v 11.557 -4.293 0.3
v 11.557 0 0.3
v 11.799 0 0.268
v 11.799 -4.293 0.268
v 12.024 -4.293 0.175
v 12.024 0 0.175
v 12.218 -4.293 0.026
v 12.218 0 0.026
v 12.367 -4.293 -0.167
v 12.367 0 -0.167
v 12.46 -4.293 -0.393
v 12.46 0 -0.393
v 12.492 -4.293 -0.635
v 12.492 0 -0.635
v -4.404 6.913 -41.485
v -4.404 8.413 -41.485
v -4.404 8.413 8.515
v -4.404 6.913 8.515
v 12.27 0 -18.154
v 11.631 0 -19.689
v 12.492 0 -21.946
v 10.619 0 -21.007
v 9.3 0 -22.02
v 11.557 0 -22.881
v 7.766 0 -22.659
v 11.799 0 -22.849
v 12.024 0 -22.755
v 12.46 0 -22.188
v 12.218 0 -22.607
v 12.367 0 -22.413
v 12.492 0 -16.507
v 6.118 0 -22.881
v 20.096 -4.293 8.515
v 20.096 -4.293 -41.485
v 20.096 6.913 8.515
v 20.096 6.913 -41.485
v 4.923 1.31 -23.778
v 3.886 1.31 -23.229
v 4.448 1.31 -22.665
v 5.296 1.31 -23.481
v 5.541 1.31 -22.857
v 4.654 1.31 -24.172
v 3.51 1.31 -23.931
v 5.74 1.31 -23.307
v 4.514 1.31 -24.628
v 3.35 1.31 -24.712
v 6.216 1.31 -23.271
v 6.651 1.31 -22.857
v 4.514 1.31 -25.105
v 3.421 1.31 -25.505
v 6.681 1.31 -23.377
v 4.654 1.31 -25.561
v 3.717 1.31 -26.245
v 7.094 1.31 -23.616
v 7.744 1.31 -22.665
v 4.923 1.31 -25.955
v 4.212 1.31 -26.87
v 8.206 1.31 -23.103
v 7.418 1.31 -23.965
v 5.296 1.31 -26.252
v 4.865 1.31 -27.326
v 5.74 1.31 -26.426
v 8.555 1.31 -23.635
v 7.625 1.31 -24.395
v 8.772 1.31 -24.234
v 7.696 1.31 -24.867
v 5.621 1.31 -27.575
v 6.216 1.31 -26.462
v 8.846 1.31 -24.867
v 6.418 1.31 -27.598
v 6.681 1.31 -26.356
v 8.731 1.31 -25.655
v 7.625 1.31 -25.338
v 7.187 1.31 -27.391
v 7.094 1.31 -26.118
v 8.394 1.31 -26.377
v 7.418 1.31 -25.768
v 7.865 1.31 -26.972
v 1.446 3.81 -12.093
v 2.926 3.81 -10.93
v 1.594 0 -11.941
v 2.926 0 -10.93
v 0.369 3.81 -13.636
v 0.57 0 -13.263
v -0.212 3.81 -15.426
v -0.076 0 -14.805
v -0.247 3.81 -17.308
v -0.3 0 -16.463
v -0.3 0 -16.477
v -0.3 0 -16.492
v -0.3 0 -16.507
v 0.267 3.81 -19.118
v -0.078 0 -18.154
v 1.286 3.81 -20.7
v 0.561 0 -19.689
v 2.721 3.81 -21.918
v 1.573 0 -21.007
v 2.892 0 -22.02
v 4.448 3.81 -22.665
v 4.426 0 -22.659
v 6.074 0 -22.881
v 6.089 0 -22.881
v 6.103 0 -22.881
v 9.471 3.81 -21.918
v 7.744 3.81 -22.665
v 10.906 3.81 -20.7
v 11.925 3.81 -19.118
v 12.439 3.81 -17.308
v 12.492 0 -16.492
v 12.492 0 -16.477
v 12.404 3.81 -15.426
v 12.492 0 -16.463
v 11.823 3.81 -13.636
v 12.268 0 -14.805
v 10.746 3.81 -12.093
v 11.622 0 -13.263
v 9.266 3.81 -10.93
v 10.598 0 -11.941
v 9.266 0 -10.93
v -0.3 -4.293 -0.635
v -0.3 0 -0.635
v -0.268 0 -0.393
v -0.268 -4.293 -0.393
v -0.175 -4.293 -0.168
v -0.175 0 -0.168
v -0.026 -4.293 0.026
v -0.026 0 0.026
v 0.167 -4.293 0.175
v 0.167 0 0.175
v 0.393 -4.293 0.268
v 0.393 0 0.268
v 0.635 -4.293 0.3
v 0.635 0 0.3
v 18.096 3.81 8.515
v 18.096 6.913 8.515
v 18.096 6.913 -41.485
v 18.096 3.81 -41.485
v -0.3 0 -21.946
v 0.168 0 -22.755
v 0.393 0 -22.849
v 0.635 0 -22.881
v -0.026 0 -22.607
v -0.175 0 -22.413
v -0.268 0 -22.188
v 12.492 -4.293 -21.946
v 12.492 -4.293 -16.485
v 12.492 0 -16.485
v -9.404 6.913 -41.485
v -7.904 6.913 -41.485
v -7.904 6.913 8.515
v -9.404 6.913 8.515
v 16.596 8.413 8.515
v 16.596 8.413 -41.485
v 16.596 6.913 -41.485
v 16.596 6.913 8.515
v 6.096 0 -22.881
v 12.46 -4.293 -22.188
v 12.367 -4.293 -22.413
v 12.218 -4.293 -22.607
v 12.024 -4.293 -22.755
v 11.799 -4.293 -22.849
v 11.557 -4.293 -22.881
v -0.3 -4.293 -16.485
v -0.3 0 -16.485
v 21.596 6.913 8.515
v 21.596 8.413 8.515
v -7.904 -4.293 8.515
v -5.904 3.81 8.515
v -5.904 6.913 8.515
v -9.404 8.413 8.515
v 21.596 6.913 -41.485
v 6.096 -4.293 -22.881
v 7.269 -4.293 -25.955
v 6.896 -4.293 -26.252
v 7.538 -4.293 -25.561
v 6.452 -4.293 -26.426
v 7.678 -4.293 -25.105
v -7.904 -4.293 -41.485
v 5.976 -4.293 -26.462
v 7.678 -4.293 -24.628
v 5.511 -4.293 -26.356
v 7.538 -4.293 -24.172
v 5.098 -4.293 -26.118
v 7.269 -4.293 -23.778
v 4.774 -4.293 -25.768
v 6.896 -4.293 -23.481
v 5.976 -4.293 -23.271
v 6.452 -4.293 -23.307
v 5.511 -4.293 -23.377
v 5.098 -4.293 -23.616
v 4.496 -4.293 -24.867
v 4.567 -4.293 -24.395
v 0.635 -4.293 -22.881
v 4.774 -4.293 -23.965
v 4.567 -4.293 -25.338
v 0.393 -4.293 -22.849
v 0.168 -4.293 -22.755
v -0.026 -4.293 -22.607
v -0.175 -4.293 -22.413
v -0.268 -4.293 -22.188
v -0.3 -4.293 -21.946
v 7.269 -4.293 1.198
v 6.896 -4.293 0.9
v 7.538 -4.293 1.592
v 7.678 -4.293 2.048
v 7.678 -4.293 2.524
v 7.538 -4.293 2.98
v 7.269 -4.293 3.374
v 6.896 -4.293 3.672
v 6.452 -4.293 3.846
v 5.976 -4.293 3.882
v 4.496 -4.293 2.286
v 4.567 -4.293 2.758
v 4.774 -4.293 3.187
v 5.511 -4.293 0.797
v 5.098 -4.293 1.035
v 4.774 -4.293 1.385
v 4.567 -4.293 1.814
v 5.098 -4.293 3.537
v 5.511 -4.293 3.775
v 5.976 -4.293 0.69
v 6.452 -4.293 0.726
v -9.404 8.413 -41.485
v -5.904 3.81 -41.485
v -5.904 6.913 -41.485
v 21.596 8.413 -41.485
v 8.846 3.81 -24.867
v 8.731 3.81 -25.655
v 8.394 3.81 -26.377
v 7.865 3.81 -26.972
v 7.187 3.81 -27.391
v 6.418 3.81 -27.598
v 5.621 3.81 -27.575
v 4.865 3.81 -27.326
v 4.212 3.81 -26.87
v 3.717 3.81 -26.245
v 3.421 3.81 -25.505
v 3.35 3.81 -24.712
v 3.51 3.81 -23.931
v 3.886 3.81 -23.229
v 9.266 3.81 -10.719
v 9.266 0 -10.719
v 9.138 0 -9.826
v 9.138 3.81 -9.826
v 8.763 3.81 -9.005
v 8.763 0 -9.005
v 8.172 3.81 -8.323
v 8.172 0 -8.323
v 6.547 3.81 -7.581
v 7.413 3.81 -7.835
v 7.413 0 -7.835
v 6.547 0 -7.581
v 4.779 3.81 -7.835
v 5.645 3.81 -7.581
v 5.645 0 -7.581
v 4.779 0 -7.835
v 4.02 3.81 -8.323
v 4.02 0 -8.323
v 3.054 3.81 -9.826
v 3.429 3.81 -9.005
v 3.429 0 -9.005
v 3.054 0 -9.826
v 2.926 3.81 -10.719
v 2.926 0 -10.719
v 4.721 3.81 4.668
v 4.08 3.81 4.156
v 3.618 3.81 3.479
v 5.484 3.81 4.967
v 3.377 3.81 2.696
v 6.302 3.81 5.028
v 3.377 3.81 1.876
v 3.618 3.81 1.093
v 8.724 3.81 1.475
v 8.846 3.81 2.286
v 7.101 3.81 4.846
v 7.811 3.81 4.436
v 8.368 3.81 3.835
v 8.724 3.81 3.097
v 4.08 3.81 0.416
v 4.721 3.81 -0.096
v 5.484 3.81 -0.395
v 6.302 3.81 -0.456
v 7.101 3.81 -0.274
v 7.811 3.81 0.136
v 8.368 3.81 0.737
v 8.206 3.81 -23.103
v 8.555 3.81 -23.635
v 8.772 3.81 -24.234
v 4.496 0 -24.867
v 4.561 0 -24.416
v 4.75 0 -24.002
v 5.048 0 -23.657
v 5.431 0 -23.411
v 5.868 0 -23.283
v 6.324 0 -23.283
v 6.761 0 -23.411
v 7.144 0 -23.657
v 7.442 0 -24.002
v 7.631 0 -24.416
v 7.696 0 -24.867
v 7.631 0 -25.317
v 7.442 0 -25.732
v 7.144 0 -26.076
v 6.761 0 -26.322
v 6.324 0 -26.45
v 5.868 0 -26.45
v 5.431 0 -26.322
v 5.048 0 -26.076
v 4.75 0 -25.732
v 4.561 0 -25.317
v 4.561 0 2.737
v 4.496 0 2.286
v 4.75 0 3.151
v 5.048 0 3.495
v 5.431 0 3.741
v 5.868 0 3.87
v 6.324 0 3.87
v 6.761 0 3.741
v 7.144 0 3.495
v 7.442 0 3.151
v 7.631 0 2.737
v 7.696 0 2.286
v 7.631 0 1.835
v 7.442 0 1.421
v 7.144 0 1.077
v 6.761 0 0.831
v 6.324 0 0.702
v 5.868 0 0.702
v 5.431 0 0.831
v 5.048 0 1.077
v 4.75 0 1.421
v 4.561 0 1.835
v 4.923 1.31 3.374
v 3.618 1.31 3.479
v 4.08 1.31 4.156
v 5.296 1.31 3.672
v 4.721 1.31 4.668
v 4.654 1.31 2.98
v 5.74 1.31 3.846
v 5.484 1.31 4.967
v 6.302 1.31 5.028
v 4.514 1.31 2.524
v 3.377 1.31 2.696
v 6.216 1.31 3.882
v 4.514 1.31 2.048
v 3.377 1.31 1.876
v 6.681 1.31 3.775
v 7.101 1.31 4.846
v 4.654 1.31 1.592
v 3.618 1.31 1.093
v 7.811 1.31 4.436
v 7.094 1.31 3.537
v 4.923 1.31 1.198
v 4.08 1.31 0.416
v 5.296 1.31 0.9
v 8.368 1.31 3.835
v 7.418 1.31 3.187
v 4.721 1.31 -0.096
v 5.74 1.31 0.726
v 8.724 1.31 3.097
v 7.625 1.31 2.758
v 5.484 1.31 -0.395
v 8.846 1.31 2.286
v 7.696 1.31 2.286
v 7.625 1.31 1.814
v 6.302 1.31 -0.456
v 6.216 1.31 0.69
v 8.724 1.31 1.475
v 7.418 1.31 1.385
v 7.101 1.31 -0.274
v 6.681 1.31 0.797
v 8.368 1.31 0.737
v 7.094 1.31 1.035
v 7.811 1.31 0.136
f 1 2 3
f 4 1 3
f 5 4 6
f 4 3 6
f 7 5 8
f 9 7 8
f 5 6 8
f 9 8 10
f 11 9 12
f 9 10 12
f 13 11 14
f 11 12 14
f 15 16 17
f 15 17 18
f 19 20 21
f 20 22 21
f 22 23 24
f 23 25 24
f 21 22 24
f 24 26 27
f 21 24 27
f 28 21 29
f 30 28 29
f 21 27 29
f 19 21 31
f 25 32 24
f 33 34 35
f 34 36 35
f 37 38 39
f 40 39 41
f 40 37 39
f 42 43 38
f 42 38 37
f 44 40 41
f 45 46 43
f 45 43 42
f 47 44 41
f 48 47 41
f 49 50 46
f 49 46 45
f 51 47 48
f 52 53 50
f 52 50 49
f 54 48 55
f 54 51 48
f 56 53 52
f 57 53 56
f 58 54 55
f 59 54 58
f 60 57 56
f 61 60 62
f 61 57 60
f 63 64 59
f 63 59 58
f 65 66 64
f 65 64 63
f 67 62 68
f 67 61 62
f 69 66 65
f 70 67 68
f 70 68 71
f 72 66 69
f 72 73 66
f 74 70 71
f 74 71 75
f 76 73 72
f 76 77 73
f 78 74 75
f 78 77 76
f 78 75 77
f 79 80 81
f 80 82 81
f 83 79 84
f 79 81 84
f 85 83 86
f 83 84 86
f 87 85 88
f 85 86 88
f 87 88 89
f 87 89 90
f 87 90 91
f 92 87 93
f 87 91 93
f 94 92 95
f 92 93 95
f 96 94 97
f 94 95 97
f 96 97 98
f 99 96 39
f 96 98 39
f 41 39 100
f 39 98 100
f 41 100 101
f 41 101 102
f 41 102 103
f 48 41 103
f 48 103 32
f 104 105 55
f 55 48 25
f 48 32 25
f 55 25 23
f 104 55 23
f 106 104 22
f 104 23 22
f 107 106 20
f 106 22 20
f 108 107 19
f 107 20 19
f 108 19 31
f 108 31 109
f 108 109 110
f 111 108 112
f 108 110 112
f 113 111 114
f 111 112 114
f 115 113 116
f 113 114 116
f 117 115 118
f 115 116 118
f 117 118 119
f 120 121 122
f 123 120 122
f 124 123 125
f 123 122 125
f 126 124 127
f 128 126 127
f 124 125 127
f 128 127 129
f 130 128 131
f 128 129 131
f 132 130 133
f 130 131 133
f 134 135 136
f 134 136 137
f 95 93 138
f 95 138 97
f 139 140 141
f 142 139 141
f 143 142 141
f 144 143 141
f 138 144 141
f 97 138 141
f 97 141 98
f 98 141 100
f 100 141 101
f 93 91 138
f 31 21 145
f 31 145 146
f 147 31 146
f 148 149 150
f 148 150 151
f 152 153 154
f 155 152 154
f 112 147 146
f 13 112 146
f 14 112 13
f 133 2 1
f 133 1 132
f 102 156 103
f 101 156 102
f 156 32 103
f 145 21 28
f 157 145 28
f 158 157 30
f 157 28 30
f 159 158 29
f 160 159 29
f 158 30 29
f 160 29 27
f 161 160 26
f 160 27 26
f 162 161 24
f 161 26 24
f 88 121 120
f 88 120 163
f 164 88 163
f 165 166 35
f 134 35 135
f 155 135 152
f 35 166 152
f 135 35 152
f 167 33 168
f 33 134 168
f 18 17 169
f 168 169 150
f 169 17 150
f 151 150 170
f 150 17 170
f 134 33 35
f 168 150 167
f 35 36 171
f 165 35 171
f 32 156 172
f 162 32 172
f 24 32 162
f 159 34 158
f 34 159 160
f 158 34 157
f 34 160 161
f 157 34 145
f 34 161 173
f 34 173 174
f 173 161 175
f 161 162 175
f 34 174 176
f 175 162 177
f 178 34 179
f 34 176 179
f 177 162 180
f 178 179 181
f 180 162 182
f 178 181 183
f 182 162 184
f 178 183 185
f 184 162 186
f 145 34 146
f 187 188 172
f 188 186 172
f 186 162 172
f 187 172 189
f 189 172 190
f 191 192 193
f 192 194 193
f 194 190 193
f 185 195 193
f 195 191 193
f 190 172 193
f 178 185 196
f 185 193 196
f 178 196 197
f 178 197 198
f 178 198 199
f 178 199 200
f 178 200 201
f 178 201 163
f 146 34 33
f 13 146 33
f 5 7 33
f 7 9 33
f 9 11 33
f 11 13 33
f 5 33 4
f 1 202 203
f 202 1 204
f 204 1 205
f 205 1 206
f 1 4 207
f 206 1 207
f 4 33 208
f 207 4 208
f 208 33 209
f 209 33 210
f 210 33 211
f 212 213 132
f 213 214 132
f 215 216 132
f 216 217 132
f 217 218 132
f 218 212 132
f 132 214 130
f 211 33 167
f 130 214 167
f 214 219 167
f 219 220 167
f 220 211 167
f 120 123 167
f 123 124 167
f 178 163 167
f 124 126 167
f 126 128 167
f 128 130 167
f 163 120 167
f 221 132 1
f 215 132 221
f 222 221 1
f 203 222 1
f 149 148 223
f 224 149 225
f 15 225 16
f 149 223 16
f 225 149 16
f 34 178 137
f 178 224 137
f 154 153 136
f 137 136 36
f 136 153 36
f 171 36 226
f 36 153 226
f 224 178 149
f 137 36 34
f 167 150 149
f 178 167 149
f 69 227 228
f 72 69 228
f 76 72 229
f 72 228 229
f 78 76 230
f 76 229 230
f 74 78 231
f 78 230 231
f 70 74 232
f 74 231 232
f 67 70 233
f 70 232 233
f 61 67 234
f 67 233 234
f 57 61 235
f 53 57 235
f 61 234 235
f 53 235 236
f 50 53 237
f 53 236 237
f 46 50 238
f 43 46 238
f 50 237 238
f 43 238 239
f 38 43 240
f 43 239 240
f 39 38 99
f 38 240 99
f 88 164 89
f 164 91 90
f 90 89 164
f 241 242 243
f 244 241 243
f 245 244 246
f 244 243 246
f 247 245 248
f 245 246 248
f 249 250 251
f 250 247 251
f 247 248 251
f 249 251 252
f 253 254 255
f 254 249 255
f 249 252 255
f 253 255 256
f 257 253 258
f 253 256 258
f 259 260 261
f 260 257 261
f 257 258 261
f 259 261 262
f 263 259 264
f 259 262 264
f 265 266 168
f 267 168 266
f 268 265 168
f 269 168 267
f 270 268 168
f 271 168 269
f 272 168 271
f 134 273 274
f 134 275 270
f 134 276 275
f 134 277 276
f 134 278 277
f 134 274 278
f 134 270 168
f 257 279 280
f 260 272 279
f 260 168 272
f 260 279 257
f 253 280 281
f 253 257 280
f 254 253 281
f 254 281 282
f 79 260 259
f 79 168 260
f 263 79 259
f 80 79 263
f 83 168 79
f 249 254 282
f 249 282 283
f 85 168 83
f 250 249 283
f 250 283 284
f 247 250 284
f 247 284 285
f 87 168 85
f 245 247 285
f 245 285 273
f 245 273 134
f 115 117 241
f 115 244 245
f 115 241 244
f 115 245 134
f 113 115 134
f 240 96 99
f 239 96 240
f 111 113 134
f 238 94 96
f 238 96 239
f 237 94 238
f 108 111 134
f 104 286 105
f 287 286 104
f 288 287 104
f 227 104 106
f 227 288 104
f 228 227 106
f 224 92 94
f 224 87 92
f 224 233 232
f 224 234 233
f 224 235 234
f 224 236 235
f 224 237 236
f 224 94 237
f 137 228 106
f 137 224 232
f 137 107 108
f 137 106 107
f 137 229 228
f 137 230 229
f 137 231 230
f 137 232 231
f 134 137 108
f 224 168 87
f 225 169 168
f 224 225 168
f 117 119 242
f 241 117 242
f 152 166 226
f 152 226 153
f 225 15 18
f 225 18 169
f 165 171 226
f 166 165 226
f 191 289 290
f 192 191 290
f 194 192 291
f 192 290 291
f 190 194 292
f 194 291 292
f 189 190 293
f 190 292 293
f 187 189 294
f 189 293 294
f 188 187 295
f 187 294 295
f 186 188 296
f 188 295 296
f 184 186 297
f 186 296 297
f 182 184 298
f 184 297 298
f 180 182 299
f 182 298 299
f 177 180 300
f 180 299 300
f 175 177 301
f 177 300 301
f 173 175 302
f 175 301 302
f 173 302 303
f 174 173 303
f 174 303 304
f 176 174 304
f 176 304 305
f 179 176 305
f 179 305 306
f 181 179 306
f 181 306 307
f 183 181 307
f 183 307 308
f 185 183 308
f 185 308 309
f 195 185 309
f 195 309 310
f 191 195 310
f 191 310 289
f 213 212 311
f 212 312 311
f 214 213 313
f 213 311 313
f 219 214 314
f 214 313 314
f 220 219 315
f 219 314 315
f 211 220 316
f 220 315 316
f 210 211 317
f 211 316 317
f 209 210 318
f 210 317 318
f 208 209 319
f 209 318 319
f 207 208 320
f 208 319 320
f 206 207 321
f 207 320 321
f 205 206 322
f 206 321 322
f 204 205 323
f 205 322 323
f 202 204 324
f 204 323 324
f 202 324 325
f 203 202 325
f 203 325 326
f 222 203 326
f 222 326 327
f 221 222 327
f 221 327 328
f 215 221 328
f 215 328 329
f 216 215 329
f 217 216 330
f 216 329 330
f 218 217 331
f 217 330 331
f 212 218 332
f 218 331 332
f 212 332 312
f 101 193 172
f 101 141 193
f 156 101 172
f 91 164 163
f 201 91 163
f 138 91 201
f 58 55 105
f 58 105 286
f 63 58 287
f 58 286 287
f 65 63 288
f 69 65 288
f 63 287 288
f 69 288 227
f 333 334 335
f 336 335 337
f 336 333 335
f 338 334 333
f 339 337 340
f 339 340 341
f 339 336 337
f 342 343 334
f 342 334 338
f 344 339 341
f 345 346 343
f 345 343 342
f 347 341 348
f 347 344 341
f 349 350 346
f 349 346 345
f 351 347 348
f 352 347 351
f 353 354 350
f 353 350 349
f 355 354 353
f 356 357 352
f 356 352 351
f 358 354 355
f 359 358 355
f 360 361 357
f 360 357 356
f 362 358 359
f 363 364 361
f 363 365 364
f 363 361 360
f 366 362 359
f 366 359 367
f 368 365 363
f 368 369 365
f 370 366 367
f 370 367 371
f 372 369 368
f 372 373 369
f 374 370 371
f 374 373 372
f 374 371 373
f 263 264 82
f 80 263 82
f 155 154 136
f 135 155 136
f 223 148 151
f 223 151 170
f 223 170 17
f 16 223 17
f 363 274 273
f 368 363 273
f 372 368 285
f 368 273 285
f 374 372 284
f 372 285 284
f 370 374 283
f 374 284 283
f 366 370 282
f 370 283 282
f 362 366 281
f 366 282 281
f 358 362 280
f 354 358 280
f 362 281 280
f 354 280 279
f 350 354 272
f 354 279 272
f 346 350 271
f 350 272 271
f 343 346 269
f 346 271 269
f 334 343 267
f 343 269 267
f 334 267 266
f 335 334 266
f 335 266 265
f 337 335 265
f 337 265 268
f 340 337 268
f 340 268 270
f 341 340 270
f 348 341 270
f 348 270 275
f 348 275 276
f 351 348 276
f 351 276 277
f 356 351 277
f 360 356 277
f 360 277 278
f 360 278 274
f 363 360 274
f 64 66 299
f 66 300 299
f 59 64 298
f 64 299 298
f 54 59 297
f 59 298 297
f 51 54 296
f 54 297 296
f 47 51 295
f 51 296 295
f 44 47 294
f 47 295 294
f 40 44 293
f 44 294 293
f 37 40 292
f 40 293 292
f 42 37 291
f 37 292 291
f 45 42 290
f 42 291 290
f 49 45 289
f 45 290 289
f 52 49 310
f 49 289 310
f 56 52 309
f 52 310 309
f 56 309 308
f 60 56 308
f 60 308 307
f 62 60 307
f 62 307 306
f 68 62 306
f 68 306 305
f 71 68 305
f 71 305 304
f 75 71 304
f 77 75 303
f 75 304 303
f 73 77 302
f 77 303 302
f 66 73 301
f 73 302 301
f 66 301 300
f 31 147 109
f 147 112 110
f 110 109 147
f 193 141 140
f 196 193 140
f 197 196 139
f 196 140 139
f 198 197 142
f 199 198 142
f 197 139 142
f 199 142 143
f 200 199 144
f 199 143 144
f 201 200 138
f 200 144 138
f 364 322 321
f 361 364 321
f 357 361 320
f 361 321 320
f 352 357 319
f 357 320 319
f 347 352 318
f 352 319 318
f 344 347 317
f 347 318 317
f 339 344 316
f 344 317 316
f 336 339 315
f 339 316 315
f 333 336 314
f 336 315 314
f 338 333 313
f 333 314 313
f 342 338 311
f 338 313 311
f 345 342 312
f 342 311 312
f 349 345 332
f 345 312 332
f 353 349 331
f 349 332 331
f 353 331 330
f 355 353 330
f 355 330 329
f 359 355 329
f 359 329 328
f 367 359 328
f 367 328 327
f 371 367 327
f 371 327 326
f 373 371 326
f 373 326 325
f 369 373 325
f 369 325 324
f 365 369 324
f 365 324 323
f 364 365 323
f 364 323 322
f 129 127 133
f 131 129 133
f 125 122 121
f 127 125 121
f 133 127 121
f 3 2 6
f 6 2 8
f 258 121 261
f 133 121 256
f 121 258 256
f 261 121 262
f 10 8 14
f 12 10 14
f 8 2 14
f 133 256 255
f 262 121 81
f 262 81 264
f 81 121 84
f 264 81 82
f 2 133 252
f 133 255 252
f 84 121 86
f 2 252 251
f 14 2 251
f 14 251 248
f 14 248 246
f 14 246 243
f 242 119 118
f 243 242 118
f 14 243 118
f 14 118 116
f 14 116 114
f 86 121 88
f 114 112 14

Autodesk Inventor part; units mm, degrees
ref_plane "YZ Plane" through (0, 0, 0) normal (1, 0, 0) x (0, 1, 0)
sketch "草圖1" plane through (0, 0, 0) normal (0, 1, 0) x (-1, 0, 0)
  line L0 (-11.557, 4.8514) -> (-6.731, 4.8514) construction
  arc A0 (-11.557, 4.8514) -> (-12.192, 4.2164) centre (-11.557, 4.2164) ccw construction
  line L1 (-12.192, 4.2164) -> (-12.192, -0.635) construction
  arc A1 (-11.557, 0) -> (-12.192, -0.635) centre (-11.557, -0.635) ccw construction
  line L2 (-11.557, 0) -> (-0.635, 0) construction
  arc A2 (0, -0.635) -> (-0.635, 0) centre (-0.635, -0.635) ccw construction
  line L3 (0, 4.2164) -> (0, -0.635) construction
  arc A3 (0, 4.2164) -> (-0.635, 4.8514) centre (-0.635, 4.2164) ccw construction
  line L4 (-5.461, 4.8514) -> (-0.635, 4.8514) construction
  line L5 (-5.461, 4.0821) -> (-5.461, 4.8514) construction
  arc A4 (-6.731, 4.0821) -> (-5.461, 4.0821) centre (-6.096, 2.286) ccw construction
  line L6 (-6.731, 4.8514) -> (-6.731, 4.0821) construction
  line L7 (-12.192, -26.797) -> (-12.192, -21.9456) construction
  arc A5 (-12.192, -26.797) -> (-11.557, -27.432) centre (-11.557, -26.797) ccw construction
  line L8 (-11.557, -27.432) -> (-6.731, -27.432) construction
  line L9 (-6.731, -27.432) -> (-6.731, -26.6627) construction
  arc A6 (-5.461, -26.6627) -> (-6.731, -26.6627) centre (-6.096, -24.8666) ccw construction
  line L10 (-5.461, -26.6627) -> (-5.461, -27.432) construction
  line L11 (-5.461, -27.432) -> (-0.635, -27.432) construction
  arc A7 (-0.635, -27.432) -> (0, -26.797) centre (-0.635, -26.797) ccw construction
  line L12 (0, -26.797) -> (0, -21.9456) construction
  arc A8 (-0.635, -22.5806) -> (0, -21.9456) centre (-0.635, -21.9456) ccw construction
  line L13 (-11.557, -22.5806) -> (-0.635, -22.5806) construction
  arc A9 (-12.192, -21.9456) -> (-11.557, -22.5806) centre (-11.557, -21.9456) ccw construction
  line L14 (-20.096, 8.5154) -> (7.904, 8.5154)
  line L15 (7.904, 8.5154) -> (7.904, -41.4846)
  line L16 (7.904, -41.4846) -> (-20.096, -41.4846)
  line L17 (-20.096, -41.4846) -> (-20.096, 8.5154)
  line L18 (-20.096, 8.5154) -> (7.904, -41.4846) construction
  line L19 (7.904, 8.5154) -> (-20.096, -41.4846) construction
  arc A10 (-3.2258, -10.7188) -> (-8.9662, -10.7188) centre (-6.096, -10.7188) ccw construction
  line L20 (-8.9662, -10.7188) -> (-8.9662, -11.1066) construction
  arc A11 (-8.9662, -11.1066) -> (-3.2258, -11.1066) centre (-6.096, -16.4846) ccw construction
  line L21 (-3.2258, -11.1066) -> (-3.2258, -10.7188) construction
  arc A12 (-7.0699, -18.6923) -> (-7.0447, -18.7033) centre (-6.096, -16.4846) ccw construction
  spline S0 degree 3 poles (-7.0947, -18.3987) (-7.1625, -18.5159) (-7.1542, -18.6137) (-7.0699, -18.6923) knots 0.499854 0.499854 0.499854 0.499854 0.500096 0.500096 0.500096 0.500096 construction
  arc A13 (-7.336, -18.252) -> (-7.0947, -18.3987) centre (-6.096, -16.4846) ccw construction
  spline S1 degree 3 poles (-7.6081, -18.365) (-7.4996, -18.4037) (-7.4089, -18.3661) (-7.336, -18.252) knots 0.499904 0.499904 0.499904 0.499904 0.500146 0.500146 0.500146 0.500146 construction
  arc A14 (-7.6294, -18.3477) -> (-7.6081, -18.365) centre (-6.096, -16.4846) ccw construction
  spline S2 degree 3 poles (-7.5741, -18.0583) (-7.671, -18.1528) (-7.6894, -18.2493) (-7.6294, -18.3477) knots 0.499854 0.499854 0.499854 0.499854 0.500096 0.500096 0.500096 0.500096 construction
  arc A15 (-7.7669, -17.8519) -> (-7.5741, -18.0583) centre (-6.096, -16.4846) ccw construction
  spline S3 degree 3 poles (-8.0594, -17.8873) (-7.9653, -17.9539) (-7.8678, -17.9421) (-7.7669, -17.8519) knots 0.499904 0.499904 0.499904 0.499904 0.500146 0.500146 0.500146 0.500146 construction
  arc A16 (-8.0752, -17.8649) -> (-8.0594, -17.8873) centre (-6.096, -16.4846) ccw construction
  spline S4 degree 3 poles (-7.9439, -17.6011) (-8.0627, -17.666) (-8.1064, -17.7539) (-8.0752, -17.8649) knots 0.499854 0.499854 0.499854 0.499854 0.500096 0.500096 0.500096 0.500096 construction
  arc A17 (-8.0738, -17.3504) -> (-7.9439, -17.6011) centre (-6.096, -16.4846) ccw construction
  spline S5 degree 3 poles (-8.365, -17.3056) (-8.2924, -17.3951) (-8.1953, -17.41) (-8.0738, -17.3504) knots 0.499904 0.499904 0.499904 0.499904 0.500146 0.500146 0.500146 0.500146 construction
  arc A18 (-8.3742, -17.2797) -> (-8.365, -17.3056) centre (-6.096, -16.4846) ccw construction
  spline S6 degree 3 poles (-8.1766, -17.0612) (-8.3085, -17.0916) (-8.3744, -17.1644) (-8.3742, -17.2797) knots 0.499854 0.499854 0.499854 0.499854 0.500096 0.500096 0.500096 0.500096 construction
  arc A19 (-8.234, -16.7847) -> (-8.1766, -17.0612) centre (-6.096, -16.4846) ccw construction
  spline S7 degree 3 poles (-8.5024, -16.663) (-8.4566, -16.7687) (-8.3671, -16.8093) (-8.234, -16.7847) knots 0.499904 0.499904 0.499904 0.499904 0.500146 0.500146 0.500146 0.500146 construction
  arc A20 (-8.5043, -16.6356) -> (-8.5024, -16.663) centre (-6.096, -16.4846) ccw construction
  spline S8 degree 3 poles (-8.255, -16.4785) (-8.3902, -16.4722) (-8.4733, -16.5245) (-8.5043, -16.6356) knots 0.499854 0.499854 0.499854 0.499854 0.500096 0.500096 0.500096 0.500096 construction
  arc A21 (-8.2357, -16.1967) -> (-8.255, -16.4785) centre (-6.096, -16.4846) ccw construction
  spline S9 degree 3 poles (-8.4613, -16.0071) (-8.4457, -16.1213) (-8.3705, -16.1845) (-8.2357, -16.1967) knots 0.499904 0.499904 0.499904 0.499904 0.500146 0.500146 0.500146 0.500146 construction
  arc A22 (-8.4557, -15.9802) -> (-8.4613, -16.0071) centre (-6.096, -16.4846) ccw construction
  spline S10 degree 3 poles (-8.1733, -15.8962) (-8.3018, -15.8537) (-8.3959, -15.8817) (-8.4557, -15.9802) knots 0.499854 0.499854 0.499854 0.499854 0.500096 0.500096 0.500096 0.500096 construction
  arc A23 (-8.0787, -15.6301) -> (-8.1733, -15.8962) centre (-6.096, -16.4846) ccw construction
  spline S11 degree 3 poles (-8.2448, -15.3867) (-8.2606, -15.5008) (-8.2052, -15.582) (-8.0787, -15.6301) knots 0.499904 0.499904 0.499904 0.499904 0.500146 0.500146 0.500146 0.500146 construction
  arc A24 (-8.2321, -15.3623) -> (-8.2448, -15.3867) centre (-6.096, -16.4846) ccw construction
  spline S12 degree 3 poles (-7.9375, -15.3576) (-8.0497, -15.282) (-8.148, -15.2835) (-8.2321, -15.3623) knots 0.499854 0.499854 0.499854 0.499854 0.500096 0.500096 0.500096 0.500096 construction
  arc A25 (-7.7746, -15.1269) -> (-7.9375, -15.3576) centre (-6.096, -16.4846) ccw construction
  spline S13 degree 3 poles (-7.8689, -14.8477) (-7.9149, -14.9533) (-7.8835, -15.0464) (-7.7746, -15.1269) knots 0.499904 0.499904 0.499904 0.499904 0.500146 0.500146 0.500146 0.500146 construction
  arc A26 (-7.8501, -14.8276) -> (-7.8689, -14.8477) centre (-6.096, -16.4846) ccw construction
  spline S14 degree 3 poles (-7.5651, -14.9025) (-7.6528, -14.7994) (-7.7478, -14.7745) (-7.8501, -14.8276) knots 0.499854 0.499854 0.499854 0.499854 0.500096 0.500096 0.500096 0.500096 construction
  arc A27 (-7.3461, -14.7243) -> (-7.5651, -14.9025) centre (-6.096, -16.4846) ccw construction
  spline S15 degree 3 poles (-7.3615, -14.4301) (-7.4343, -14.5194) (-7.4292, -14.6175) (-7.3461, -14.7243) knots 0.499904 0.499904 0.499904 0.499904 0.500146 0.500146 0.500146 0.500146 construction
  arc A28 (-7.338, -14.4158) -> (-7.3615, -14.4301) centre (-6.096, -16.4846) ccw construction
  spline S16 degree 3 poles (-7.0838, -14.5648) (-7.1404, -14.4419) (-7.2252, -14.3922) (-7.338, -14.4158) knots 0.499854 0.499854 0.499854 0.499854 0.500096 0.500096 0.500096 0.500096 construction
  arc A29 (-6.8248, -14.4523) -> (-7.0838, -14.5648) centre (-6.096, -16.4846) ccw construction
  spline S17 degree 3 poles (-6.7602, -14.1648) (-6.8545, -14.2312) (-6.876, -14.327) (-6.8248, -14.4523) knots 0.499904 0.499904 0.499904 0.499904 0.500146 0.500146 0.500146 0.500146 construction
  arc A30 (-6.7338, -14.1574) -> (-6.7602, -14.1648) centre (-6.096, -16.4846) ccw construction
  spline S18 degree 3 poles (-6.5292, -14.3695) (-6.5506, -14.2359) (-6.6188, -14.1652) (-6.7338, -14.1574) knots 0.499854 0.499854 0.499854 0.499854 0.500096 0.500096 0.500096 0.500096 construction
  arc A31 (-6.2495, -14.3311) -> (-6.5292, -14.3695) centre (-6.096, -16.4846) ccw construction
  spline S19 degree 3 poles (-6.1097, -14.0716) (-6.2184, -14.1101) (-6.265, -14.1966) (-6.2495, -14.3311) knots 0.499904 0.499904 0.499904 0.499904 0.500146 0.500146 0.500146 0.500146 construction
  arc A32 (-6.0823, -14.0716) -> (-6.1097, -14.0716) centre (-6.096, -16.4846) ccw construction
  spline S20 degree 3 poles (-5.9425, -14.3311) (-5.927, -14.1966) (-5.9736, -14.1101) (-6.0823, -14.0716) knots 0.499854 0.499854 0.499854 0.499854 0.500096 0.500096 0.500096 0.500096 construction
  arc A33 (-5.6628, -14.3695) -> (-5.9425, -14.3311) centre (-6.096, -16.4846) ccw construction
  spline S21 degree 3 poles (-5.4582, -14.1574) (-5.5732, -14.1652) (-5.6414, -14.2359) (-5.6628, -14.3695) knots 0.499904 0.499904 0.499904 0.499904 0.500146 0.500146 0.500146 0.500146 construction
  arc A34 (-5.4318, -14.1648) -> (-5.4582, -14.1574) centre (-6.096, -16.4846) ccw construction
  spline S22 degree 3 poles (-5.3672, -14.4523) (-5.316, -14.327) (-5.3375, -14.2312) (-5.4318, -14.1648) knots 0.499854 0.499854 0.499854 0.499854 0.500096 0.500096 0.500096 0.500096 construction
  arc A35 (-5.1082, -14.5648) -> (-5.3672, -14.4523) centre (-6.096, -16.4846) ccw construction
  spline S23 degree 3 poles (-4.854, -14.4158) (-4.9668, -14.3922) (-5.0516, -14.4419) (-5.1082, -14.5648) knots 0.499904 0.499904 0.499904 0.499904 0.500146 0.500146 0.500146 0.500146 construction
  arc A36 (-4.8305, -14.4301) -> (-4.854, -14.4158) centre (-6.096, -16.4846) ccw construction
  spline S24 degree 3 poles (-4.8459, -14.7243) (-4.7628, -14.6175) (-4.7577, -14.5194) (-4.8305, -14.4301) knots 0.499854 0.499854 0.499854 0.499854 0.500096 0.500096 0.500096 0.500096 construction
  arc A37 (-4.6269, -14.9025) -> (-4.8459, -14.7243) centre (-6.096, -16.4846) ccw construction
  spline S25 degree 3 poles (-4.3419, -14.8276) (-4.4442, -14.7745) (-4.5392, -14.7994) (-4.6269, -14.9025) knots 0.499904 0.499904 0.499904 0.499904 0.500146 0.500146 0.500146 0.500146 construction
  arc A38 (-4.3231, -14.8477) -> (-4.3419, -14.8276) centre (-6.096, -16.4846) ccw construction
  spline S26 degree 3 poles (-4.4174, -15.1269) (-4.3085, -15.0464) (-4.2771, -14.9533) (-4.3231, -14.8477) knots 0.499854 0.499854 0.499854 0.499854 0.500096 0.500096 0.500096 0.500096 construction
  arc A39 (-4.2545, -15.3576) -> (-4.4174, -15.1269) centre (-6.096, -16.4846) ccw construction
  spline S27 degree 3 poles (-3.9599, -15.3623) (-4.044, -15.2835) (-4.1423, -15.282) (-4.2545, -15.3576) knots 0.499904 0.499904 0.499904 0.499904 0.500146 0.500146 0.500146 0.500146 construction
  arc A40 (-3.9472, -15.3867) -> (-3.9599, -15.3623) centre (-6.096, -16.4846) ccw construction
  spline S28 degree 3 poles (-4.1133, -15.6301) (-3.9868, -15.582) (-3.9314, -15.5008) (-3.9472, -15.3867) knots 0.499854 0.499854 0.499854 0.499854 0.500096 0.500096 0.500096 0.500096 construction
  arc A41 (-4.0187, -15.8962) -> (-4.1133, -15.6301) centre (-6.096, -16.4846) ccw construction
  spline S29 degree 3 poles (-3.7363, -15.9802) (-3.7961, -15.8817) (-3.8902, -15.8537) (-4.0187, -15.8962) knots 0.499904 0.499904 0.499904 0.499904 0.500146 0.500146 0.500146 0.500146 construction
  arc A42 (-3.7307, -16.0071) -> (-3.7363, -15.9802) centre (-6.096, -16.4846) ccw construction
  spline S30 degree 3 poles (-3.9563, -16.1967) (-3.8215, -16.1845) (-3.7463, -16.1213) (-3.7307, -16.0071) knots 0.499854 0.499854 0.499854 0.499854 0.500096 0.500096 0.500096 0.500096 construction
  arc A43 (-3.937, -16.4785) -> (-3.9563, -16.1967) centre (-6.096, -16.4846) ccw construction
  spline S31 degree 3 poles (-3.6877, -16.6356) (-3.7187, -16.5245) (-3.8018, -16.4722) (-3.937, -16.4785) knots 0.499904 0.499904 0.499904 0.499904 0.500146 0.500146 0.500146 0.500146 construction
  arc A44 (-3.6896, -16.663) -> (-3.6877, -16.6356) centre (-6.096, -16.4846) ccw construction
  spline S32 degree 3 poles (-3.958, -16.7847) (-3.8249, -16.8093) (-3.7354, -16.7687) (-3.6896, -16.663) knots 0.499854 0.499854 0.499854 0.499854 0.500096 0.500096 0.500096 0.500096 construction
  arc A45 (-4.0154, -17.0612) -> (-3.958, -16.7847) centre (-6.096, -16.4846) ccw construction
  spline S33 degree 3 poles (-3.8178, -17.2797) (-3.8176, -17.1644) (-3.8835, -17.0916) (-4.0154, -17.0612) knots 0.499904 0.499904 0.499904 0.499904 0.500146 0.500146 0.500146 0.500146 construction
  arc A46 (-3.827, -17.3056) -> (-3.8178, -17.2797) centre (-6.096, -16.4846) ccw construction
  spline S34 degree 3 poles (-4.1182, -17.3504) (-3.9967, -17.41) (-3.8996, -17.3951) (-3.827, -17.3056) knots 0.499854 0.499854 0.499854 0.499854 0.500096 0.500096 0.500096 0.500096 construction
  arc A47 (-4.2481, -17.6011) -> (-4.1182, -17.3504) centre (-6.096, -16.4846) ccw construction
  spline S35 degree 3 poles (-4.1168, -17.8649) (-4.0856, -17.7539) (-4.1293, -17.666) (-4.2481, -17.6011) knots 0.499904 0.499904 0.499904 0.499904 0.500146 0.500146 0.500146 0.500146 construction
  arc A48 (-4.1326, -17.8873) -> (-4.1168, -17.8649) centre (-6.096, -16.4846) ccw construction
  spline S36 degree 3 poles (-4.4251, -17.8519) (-4.3242, -17.9421) (-4.2267, -17.9539) (-4.1326, -17.8873) knots 0.499854 0.499854 0.499854 0.499854 0.500096 0.500096 0.500096 0.500096 construction
  arc A49 (-4.6179, -18.0583) -> (-4.4251, -17.8519) centre (-6.096, -16.4846) ccw construction
  spline S37 degree 3 poles (-4.5626, -18.3477) (-4.5026, -18.2493) (-4.521, -18.1528) (-4.6179, -18.0583) knots 0.499904 0.499904 0.499904 0.499904 0.500146 0.500146 0.500146 0.500146 construction
  arc A50 (-4.5839, -18.365) -> (-4.5626, -18.3477) centre (-6.096, -16.4846) ccw construction
  spline S38 degree 3 poles (-4.856, -18.252) (-4.7831, -18.3661) (-4.6924, -18.4037) (-4.5839, -18.365) knots 0.499854 0.499854 0.499854 0.499854 0.500096 0.500096 0.500096 0.500096 construction
  arc A51 (-5.0973, -18.3987) -> (-4.856, -18.252) centre (-6.096, -16.4846) ccw construction
  spline S39 degree 3 poles (-5.1221, -18.6923) (-5.0378, -18.6137) (-5.0295, -18.5159) (-5.0973, -18.3987) knots 0.499904 0.499904 0.499904 0.499904 0.500146 0.500146 0.500146 0.500146 construction
  arc A52 (-5.1473, -18.7033) -> (-5.1221, -18.6923) centre (-6.096, -16.4846) ccw construction
  spline S40 degree 3 poles (-5.3788, -18.521) (-5.3394, -18.6505) (-5.2623, -18.7113) (-5.1473, -18.7033) knots 0.499854 0.499854 0.499854 0.499854 0.500096 0.500096 0.500096 0.500096 construction
  arc A53 (-5.6507, -18.5972) -> (-5.3788, -18.521) centre (-6.096, -16.4846) ccw construction
  spline S41 degree 3 poles (-5.7538, -18.8732) (-5.6514, -18.8203) (-5.6171, -18.7283) (-5.6507, -18.5972) knots 0.499904 0.499904 0.499904 0.499904 0.500146 0.500146 0.500146 0.500146 construction
  arc A54 (-5.781, -18.877) -> (-5.7538, -18.8732) centre (-6.096, -16.4846) ccw construction
  spline S42 degree 3 poles (-5.9548, -18.639) (-5.9518, -18.7743) (-5.8939, -18.8536) (-5.781, -18.877) knots 0.499854 0.499854 0.499854 0.499854 0.500096 0.500096 0.500096 0.500096 construction
  arc A55 (-6.2372, -18.639) -> (-5.9548, -18.639) centre (-6.096, -16.4846) ccw construction
  spline S43 degree 3 poles (-6.411, -18.877) (-6.2981, -18.8536) (-6.2402, -18.7743) (-6.2372, -18.639) knots 0.499904 0.499904 0.499904 0.499904 0.500146 0.500146 0.500146 0.500146 construction
  arc A56 (-6.4382, -18.8732) -> (-6.411, -18.877) centre (-6.096, -16.4846) ccw construction
  spline S44 degree 3 poles (-6.5413, -18.5972) (-6.5749, -18.7283) (-6.5406, -18.8203) (-6.4382, -18.8732) knots 0.499854 0.499854 0.499854 0.499854 0.500096 0.500096 0.500096 0.500096 construction
  arc A57 (-6.8132, -18.521) -> (-6.5413, -18.5972) centre (-6.096, -16.4846) ccw construction
  spline S45 degree 3 poles (-7.0447, -18.7033) (-6.9297, -18.7113) (-6.8526, -18.6505) (-6.8132, -18.521) knots 0.499904 0.499904 0.499904 0.499904 0.500146 0.500146 0.500146 0.500146 construction
  line L22 (0, -16.4846) -> (0, -0.635) construction
  arc A58 (0, -0.635) -> (-0.635, 0) centre (-0.635, -0.635) ccw construction
  line L23 (-0.635, 0) -> (-11.557, 0) construction
  arc A59 (-11.557, 0) -> (-12.192, -0.635) centre (-11.557, -0.635) ccw construction
  line L24 (-12.192, -0.635) -> (-12.192, -16.4846) construction
  arc A60 (-8.9662, -11.1066) -> (-12.192, -16.4846) centre (-6.096, -16.4846) ccw construction
  line L25 (-8.9662, -10.7188) -> (-8.9662, -11.1066) construction
  arc A61 (-3.2258, -10.7188) -> (-8.9662, -10.7188) centre (-6.096, -10.7188) ccw construction
  line L26 (-3.2258, -11.1066) -> (-3.2258, -10.7188) construction
  arc A62 (0, -16.4846) -> (-3.2258, -11.1066) centre (-6.096, -16.4846) ccw construction
  line L27 (-6.096, -22.5806) -> (-0.635, -22.5806) construction
  arc A63 (-0.635, -22.5806) -> (0, -21.9456) centre (-0.635, -21.9456) ccw construction
  line L28 (0, -21.9456) -> (0, -16.4846) construction
  arc A64 (-6.096, -22.5806) -> (0, -16.4846) centre (-6.096, -16.4846) ccw construction
  line L29 (-12.192, -16.4846) -> (-12.192, -21.9456) construction
  arc A65 (-12.192, -21.9456) -> (-11.557, -22.5806) centre (-11.557, -21.9456) ccw construction
  line L30 (-11.557, -22.5806) -> (-6.096, -22.5806) construction
  arc A66 (-12.192, -16.4846) -> (-6.096, -22.5806) centre (-6.096, -16.4846) ccw construction
  line L31 (0.3, -0.635) -> (0.3, -16.4846)
  line L32 (0.3, -16.4846) -> (0.3, -21.9456)
  arc A67 (-0.635, -22.8806) -> (0.3, -21.9456) centre (-0.635, -21.9456) ccw
  line L33 (-0.635, -22.8806) -> (-6.096, -22.8806)
  line L34 (-6.096, -22.8806) -> (-11.557, -22.8806)
  arc A68 (-12.492, -21.9456) -> (-11.557, -22.8806) centre (-11.557, -21.9456) ccw
  line L35 (-12.492, -21.9456) -> (-12.492, -16.4846)
  line L36 (-12.492, -16.4846) -> (-12.492, -0.635)
  arc A69 (-11.557, 0.3) -> (-12.492, -0.635) centre (-11.557, -0.635) ccw
  line L37 (-11.557, 0.3) -> (-0.635, 0.3)
  arc A70 (0.3, -0.635) -> (-0.635, 0.3) centre (-0.635, -0.635) ccw
  circle A71 centre (-6.096, 2.286) radius 1.6
  circle A72 centre (-6.096, -24.8666) radius 1.6
  point P0 (0, 0)
  dimension "d0" = 28
  dimension "d1" = 50
  dimension "d2" = 0.3
  dimension "d3" = 3.2
  dimension "d4" = 3.2
ref_plane "工作平面1" through (0, -4.2926, -0.635) normal (0, 1, 0) x (0, 0, 1)
extrude "擠出1" add sketch "草圖1" against normal up to surface (4.2926 mm away)
sketch "草圖2" plane through (0, 0, 0) normal (0, 1, 0) x (1, 0, 0)
  line L0 (20.096, 41.4846) -> (-7.904, 41.4846) projected
  line L1 (-7.904, 41.4846) -> (-7.904, -8.5154) projected
  line L2 (-7.904, -8.5154) -> (20.096, -8.5154) projected
  line L3 (20.096, -8.5154) -> (20.096, 41.4846) projected
  line L4 (11.557, -0.3) -> (0.635, -0.3) construction
  arc A0 (-0.3, 0.635) -> (0.635, -0.3) centre (0.635, 0.635) ccw construction
  line L5 (-0.3, 0.635) -> (-0.3, 21.9456) construction
  arc A1 (0.635, 22.8806) -> (-0.3, 21.9456) centre (0.635, 21.9456) ccw construction
  line L6 (0.635, 22.8806) -> (11.557, 22.8806) construction
  arc A2 (12.492, 21.9456) -> (11.557, 22.8806) centre (11.557, 21.9456) ccw construction
  line L7 (12.492, 21.9456) -> (12.492, 0.635) construction
  arc A3 (11.557, -0.3) -> (12.492, 0.635) centre (11.557, 0.635) ccw construction
  circle A4 centre (6.096, 24.8666) radius 1.6 projected
  circle A5 centre (6.096, -2.286) radius 1.6 projected
  arc A6 (3.2258, 10.7188) -> (8.9662, 10.7188) centre (6.096, 10.7188) ccw projected
  line L8 (8.9662, 10.7188) -> (8.9662, 11.1066) projected
  arc A7 (8.9662, 11.1066) -> (3.2258, 11.1066) centre (6.096, 16.4846) ccw projected
  line L9 (3.2258, 11.1066) -> (3.2258, 10.7188) projected
  arc A8 (7.0699, 18.6923) -> (7.0447, 18.7033) centre (6.096, 16.4846) ccw projected
  spline S0 degree 3 poles (7.0947, 18.3987) (7.1625, 18.5159) (7.1542, 18.6137) (7.0699, 18.6923) knots 0.499854 0.499854 0.499854 0.499854 0.500096 0.500096 0.500096 0.500096 projected
  arc A9 (7.336, 18.252) -> (7.0947, 18.3987) centre (6.096, 16.4846) ccw projected
  spline S1 degree 3 poles (7.6081, 18.365) (7.4996, 18.4037) (7.4089, 18.3661) (7.336, 18.252) knots 0.499904 0.499904 0.499904 0.499904 0.500146 0.500146 0.500146 0.500146 projected
  arc A10 (7.6294, 18.3477) -> (7.6081, 18.365) centre (6.096, 16.4846) ccw projected
  spline S2 degree 3 poles (7.5741, 18.0583) (7.671, 18.1528) (7.6894, 18.2493) (7.6294, 18.3477) knots 0.499854 0.499854 0.499854 0.499854 0.500096 0.500096 0.500096 0.500096 projected
  arc A11 (7.7669, 17.8519) -> (7.5741, 18.0583) centre (6.096, 16.4846) ccw projected
  spline S3 degree 3 poles (8.0594, 17.8873) (7.9653, 17.9539) (7.8678, 17.9421) (7.7669, 17.8519) knots 0.499904 0.499904 0.499904 0.499904 0.500146 0.500146 0.500146 0.500146 projected
  arc A12 (8.0752, 17.8649) -> (8.0594, 17.8873) centre (6.096, 16.4846) ccw projected
  spline S4 degree 3 poles (7.9439, 17.6011) (8.0627, 17.666) (8.1064, 17.7539) (8.0752, 17.8649) knots 0.499854 0.499854 0.499854 0.499854 0.500096 0.500096 0.500096 0.500096 projected
  arc A13 (8.0738, 17.3504) -> (7.9439, 17.6011) centre (6.096, 16.4846) ccw projected
  spline S5 degree 3 poles (8.365, 17.3056) (8.2924, 17.3951) (8.1953, 17.41) (8.0738, 17.3504) knots 0.499904 0.499904 0.499904 0.499904 0.500146 0.500146 0.500146 0.500146 projected
  arc A14 (8.3742, 17.2797) -> (8.365, 17.3056) centre (6.096, 16.4846) ccw projected
  spline S6 degree 3 poles (8.1766, 17.0612) (8.3085, 17.0916) (8.3744, 17.1644) (8.3742, 17.2797) knots 0.499854 0.499854 0.499854 0.499854 0.500096 0.500096 0.500096 0.500096 projected
  arc A15 (8.234, 16.7847) -> (8.1766, 17.0612) centre (6.096, 16.4846) ccw projected
  spline S7 degree 3 poles (8.5024, 16.663) (8.4566, 16.7687) (8.3671, 16.8093) (8.234, 16.7847) knots 0.499904 0.499904 0.499904 0.499904 0.500146 0.500146 0.500146 0.500146 projected
  arc A16 (8.5043, 16.6356) -> (8.5024, 16.663) centre (6.096, 16.4846) ccw projected
  spline S8 degree 3 poles (8.255, 16.4785) (8.3902, 16.4722) (8.4733, 16.5245) (8.5043, 16.6356) knots 0.499854 0.499854 0.499854 0.499854 0.500096 0.500096 0.500096 0.500096 projected
  arc A17 (8.2357, 16.1967) -> (8.255, 16.4785) centre (6.096, 16.4846) ccw projected
  spline S9 degree 3 poles (8.4613, 16.0071) (8.4457, 16.1213) (8.3705, 16.1845) (8.2357, 16.1967) knots 0.499904 0.499904 0.499904 0.499904 0.500146 0.500146 0.500146 0.500146 projected
  arc A18 (8.4557, 15.9802) -> (8.4613, 16.0071) centre (6.096, 16.4846) ccw projected
  spline S10 degree 3 poles (8.1733, 15.8962) (8.3018, 15.8537) (8.3959, 15.8817) (8.4557, 15.9802) knots 0.499854 0.499854 0.499854 0.499854 0.500096 0.500096 0.500096 0.500096 projected
  arc A19 (8.0787, 15.6301) -> (8.1733, 15.8962) centre (6.096, 16.4846) ccw projected
  spline S11 degree 3 poles (8.2448, 15.3867) (8.2606, 15.5008) (8.2052, 15.582) (8.0787, 15.6301) knots 0.499904 0.499904 0.499904 0.499904 0.500146 0.500146 0.500146 0.500146 projected
  arc A20 (8.2321, 15.3623) -> (8.2448, 15.3867) centre (6.096, 16.4846) ccw projected
  spline S12 degree 3 poles (7.9375, 15.3576) (8.0497, 15.282) (8.148, 15.2835) (8.2321, 15.3623) knots 0.499854 0.499854 0.499854 0.499854 0.500096 0.500096 0.500096 0.500096 projected
  arc A21 (7.7746, 15.1269) -> (7.9375, 15.3576) centre (6.096, 16.4846) ccw projected
  spline S13 degree 3 poles (7.8689, 14.8477) (7.9149, 14.9533) (7.8835, 15.0464) (7.7746, 15.1269) knots 0.499904 0.499904 0.499904 0.499904 0.500146 0.500146 0.500146 0.500146 projected
  arc A22 (7.8501, 14.8276) -> (7.8689, 14.8477) centre (6.096, 16.4846) ccw projected
  spline S14 degree 3 poles (7.5651, 14.9025) (7.6528, 14.7994) (7.7478, 14.7745) (7.8501, 14.8276) knots 0.499854 0.499854 0.499854 0.499854 0.500096 0.500096 0.500096 0.500096 projected
  arc A23 (7.3461, 14.7243) -> (7.5651, 14.9025) centre (6.096, 16.4846) ccw projected
  spline S15 degree 3 poles (7.3615, 14.4301) (7.4343, 14.5194) (7.4292, 14.6175) (7.3461, 14.7243) knots 0.499904 0.499904 0.499904 0.499904 0.500146 0.500146 0.500146 0.500146 projected
  arc A24 (7.338, 14.4158) -> (7.3615, 14.4301) centre (6.096, 16.4846) ccw projected
  spline S16 degree 3 poles (7.0838, 14.5648) (7.1404, 14.4419) (7.2252, 14.3922) (7.338, 14.4158) knots 0.499854 0.499854 0.499854 0.499854 0.500096 0.500096 0.500096 0.500096 projected
  arc A25 (6.8248, 14.4523) -> (7.0838, 14.5648) centre (6.096, 16.4846) ccw projected
  spline S17 degree 3 poles (6.7602, 14.1648) (6.8545, 14.2312) (6.876, 14.327) (6.8248, 14.4523) knots 0.499904 0.499904 0.499904 0.499904 0.500146 0.500146 0.500146 0.500146 projected
  arc A26 (6.7338, 14.1574) -> (6.7602, 14.1648) centre (6.096, 16.4846) ccw projected
  spline S18 degree 3 poles (6.5292, 14.3695) (6.5506, 14.2359) (6.6188, 14.1652) (6.7338, 14.1574) knots 0.499854 0.499854 0.499854 0.499854 0.500096 0.500096 0.500096 0.500096 projected
  arc A27 (6.2495, 14.3311) -> (6.5292, 14.3695) centre (6.096, 16.4846) ccw projected
  spline S19 degree 3 poles (6.1097, 14.0716) (6.2184, 14.1101) (6.265, 14.1966) (6.2495, 14.3311) knots 0.499904 0.499904 0.499904 0.499904 0.500146 0.500146 0.500146 0.500146 projected
  arc A28 (6.0823, 14.0716) -> (6.1097, 14.0716) centre (6.096, 16.4846) ccw projected
  spline S20 degree 3 poles (5.9425, 14.3311) (5.927, 14.1966) (5.9736, 14.1101) (6.0823, 14.0716) knots 0.499854 0.499854 0.499854 0.499854 0.500096 0.500096 0.500096 0.500096 projected
  arc A29 (5.6628, 14.3695) -> (5.9425, 14.3311) centre (6.096, 16.4846) ccw projected
  spline S21 degree 3 poles (5.4582, 14.1574) (5.5732, 14.1652) (5.6414, 14.2359) (5.6628, 14.3695) knots 0.499904 0.499904 0.499904 0.499904 0.500146 0.500146 0.500146 0.500146 projected
  arc A30 (5.4318, 14.1648) -> (5.4582, 14.1574) centre (6.096, 16.4846) ccw projected
  spline S22 degree 3 poles (5.3672, 14.4523) (5.316, 14.327) (5.3375, 14.2312) (5.4318, 14.1648) knots 0.499854 0.499854 0.499854 0.499854 0.500096 0.500096 0.500096 0.500096 projected
  arc A31 (5.1082, 14.5648) -> (5.3672, 14.4523) centre (6.096, 16.4846) ccw projected
  spline S23 degree 3 poles (4.854, 14.4158) (4.9668, 14.3922) (5.0516, 14.4419) (5.1082, 14.5648) knots 0.499904 0.499904 0.499904 0.499904 0.500146 0.500146 0.500146 0.500146 projected
  arc A32 (4.8305, 14.4301) -> (4.854, 14.4158) centre (6.096, 16.4846) ccw projected
  spline S24 degree 3 poles (4.8459, 14.7243) (4.7628, 14.6175) (4.7577, 14.5194) (4.8305, 14.4301) knots 0.499854 0.499854 0.499854 0.499854 0.500096 0.500096 0.500096 0.500096 projected
  arc A33 (4.6269, 14.9025) -> (4.8459, 14.7243) centre (6.096, 16.4846) ccw projected
  spline S25 degree 3 poles (4.3419, 14.8276) (4.4442, 14.7745) (4.5392, 14.7994) (4.6269, 14.9025) knots 0.499904 0.499904 0.499904 0.499904 0.500146 0.500146 0.500146 0.500146 projected
  arc A34 (4.3231, 14.8477) -> (4.3419, 14.8276) centre (6.096, 16.4846) ccw projected
  spline S26 degree 3 poles (4.4174, 15.1269) (4.3085, 15.0464) (4.2771, 14.9533) (4.3231, 14.8477) knots 0.499854 0.499854 0.499854 0.499854 0.500096 0.500096 0.500096 0.500096 projected
  arc A35 (4.2545, 15.3576) -> (4.4174, 15.1269) centre (6.096, 16.4846) ccw projected
  spline S27 degree 3 poles (3.9599, 15.3623) (4.044, 15.2835) (4.1423, 15.282) (4.2545, 15.3576) knots 0.499904 0.499904 0.499904 0.499904 0.500146 0.500146 0.500146 0.500146 projected
  arc A36 (3.9472, 15.3867) -> (3.9599, 15.3623) centre (6.096, 16.4846) ccw projected
  spline S28 degree 3 poles (4.1133, 15.6301) (3.9868, 15.582) (3.9314, 15.5008) (3.9472, 15.3867) knots 0.499854 0.499854 0.499854 0.499854 0.500096 0.500096 0.500096 0.500096 projected
  arc A37 (4.0187, 15.8962) -> (4.1133, 15.6301) centre (6.096, 16.4846) ccw projected
  spline S29 degree 3 poles (3.7363, 15.9802) (3.7961, 15.8817) (3.8902, 15.8537) (4.0187, 15.8962) knots 0.499904 0.499904 0.499904 0.499904 0.500146 0.500146 0.500146 0.500146 projected
  arc A38 (3.7307, 16.0071) -> (3.7363, 15.9802) centre (6.096, 16.4846) ccw projected
  spline S30 degree 3 poles (3.9563, 16.1967) (3.8215, 16.1845) (3.7463, 16.1213) (3.7307, 16.0071) knots 0.499854 0.499854 0.499854 0.499854 0.500096 0.500096 0.500096 0.500096 projected
  arc A39 (3.937, 16.4785) -> (3.9563, 16.1967) centre (6.096, 16.4846) ccw projected
  spline S31 degree 3 poles (3.6877, 16.6356) (3.7187, 16.5245) (3.8018, 16.4722) (3.937, 16.4785) knots 0.499904 0.499904 0.499904 0.499904 0.500146 0.500146 0.500146 0.500146 projected
  arc A40 (3.6896, 16.663) -> (3.6877, 16.6356) centre (6.096, 16.4846) ccw projected
  spline S32 degree 3 poles (3.958, 16.7847) (3.8249, 16.8093) (3.7354, 16.7687) (3.6896, 16.663) knots 0.499854 0.499854 0.499854 0.499854 0.500096 0.500096 0.500096 0.500096 projected
  arc A41 (4.0154, 17.0612) -> (3.958, 16.7847) centre (6.096, 16.4846) ccw projected
  spline S33 degree 3 poles (3.8178, 17.2797) (3.8176, 17.1644) (3.8835, 17.0916) (4.0154, 17.0612) knots 0.499904 0.499904 0.499904 0.499904 0.500146 0.500146 0.500146 0.500146 projected
  arc A42 (3.827, 17.3056) -> (3.8178, 17.2797) centre (6.096, 16.4846) ccw projected
  spline S34 degree 3 poles (4.1182, 17.3504) (3.9967, 17.41) (3.8996, 17.3951) (3.827, 17.3056) knots 0.499854 0.499854 0.499854 0.499854 0.500096 0.500096 0.500096 0.500096 projected
  arc A43 (4.2481, 17.6011) -> (4.1182, 17.3504) centre (6.096, 16.4846) ccw projected
  spline S35 degree 3 poles (4.1168, 17.8649) (4.0856, 17.7539) (4.1293, 17.666) (4.2481, 17.6011) knots 0.499904 0.499904 0.499904 0.499904 0.500146 0.500146 0.500146 0.500146 projected
  arc A44 (4.1326, 17.8873) -> (4.1168, 17.8649) centre (6.096, 16.4846) ccw projected
  spline S36 degree 3 poles (4.4251, 17.8519) (4.3242, 17.9421) (4.2267, 17.9539) (4.1326, 17.8873) knots 0.499854 0.499854 0.499854 0.499854 0.500096 0.500096 0.500096 0.500096 projected
  arc A45 (4.6179, 18.0583) -> (4.4251, 17.8519) centre (6.096, 16.4846) ccw projected
  spline S37 degree 3 poles (4.5626, 18.3477) (4.5026, 18.2493) (4.521, 18.1528) (4.6179, 18.0583) knots 0.499904 0.499904 0.499904 0.499904 0.500146 0.500146 0.500146 0.500146 projected
  arc A46 (4.5839, 18.365) -> (4.5626, 18.3477) centre (6.096, 16.4846) ccw projected
  spline S38 degree 3 poles (4.856, 18.252) (4.7831, 18.3661) (4.6924, 18.4037) (4.5839, 18.365) knots 0.499854 0.499854 0.499854 0.499854 0.500096 0.500096 0.500096 0.500096 projected
  arc A47 (5.0973, 18.3987) -> (4.856, 18.252) centre (6.096, 16.4846) ccw projected
  spline S39 degree 3 poles (5.1221, 18.6923) (5.0378, 18.6137) (5.0295, 18.5159) (5.0973, 18.3987) knots 0.499904 0.499904 0.499904 0.499904 0.500146 0.500146 0.500146 0.500146 projected
  arc A48 (5.1473, 18.7033) -> (5.1221, 18.6923) centre (6.096, 16.4846) ccw projected
  spline S40 degree 3 poles (5.3788, 18.521) (5.3394, 18.6505) (5.2623, 18.7113) (5.1473, 18.7033) knots 0.499854 0.499854 0.499854 0.499854 0.500096 0.500096 0.500096 0.500096 projected
  arc A49 (5.6507, 18.5972) -> (5.3788, 18.521) centre (6.096, 16.4846) ccw projected
  spline S41 degree 3 poles (5.7538, 18.8732) (5.6514, 18.8203) (5.6171, 18.7283) (5.6507, 18.5972) knots 0.499904 0.499904 0.499904 0.499904 0.500146 0.500146 0.500146 0.500146 projected
  arc A50 (5.781, 18.877) -> (5.7538, 18.8732) centre (6.096, 16.4846) ccw projected
  spline S42 degree 3 poles (5.9548, 18.639) (5.9518, 18.7743) (5.8939, 18.8536) (5.781, 18.877) knots 0.499854 0.499854 0.499854 0.499854 0.500096 0.500096 0.500096 0.500096 projected
  arc A51 (6.2372, 18.639) -> (5.9548, 18.639) centre (6.096, 16.4846) ccw projected
  spline S43 degree 3 poles (6.411, 18.877) (6.2981, 18.8536) (6.2402, 18.7743) (6.2372, 18.639) knots 0.499904 0.499904 0.499904 0.499904 0.500146 0.500146 0.500146 0.500146 projected
  arc A52 (6.4382, 18.8732) -> (6.411, 18.877) centre (6.096, 16.4846) ccw projected
  spline S44 degree 3 poles (6.5413, 18.5972) (6.5749, 18.7283) (6.5406, 18.8203) (6.4382, 18.8732) knots 0.499854 0.499854 0.499854 0.499854 0.500096 0.500096 0.500096 0.500096 projected
  arc A53 (6.8132, 18.521) -> (6.5413, 18.5972) centre (6.096, 16.4846) ccw projected
  spline S45 degree 3 poles (7.0447, 18.7033) (6.9297, 18.7113) (6.8526, 18.6505) (6.8132, 18.521) knots 0.499904 0.499904 0.499904 0.499904 0.500146 0.500146 0.500146 0.500146 projected
  arc A54 (9.2662, 10.9295) -> (2.9258, 10.9295) centre (6.096, 16.4846) ccw
  line L10 (9.2662, 10.9295) -> (9.2662, 10.7188)
  arc A55 (2.9258, 10.7188) -> (9.2662, 10.7188) centre (6.096, 10.7188) ccw
  line L11 (2.9258, 10.7188) -> (2.9258, 10.9295)
  point P0 (0, 0)
  dimension "d7" = 0.3
ref_plane "工作平面2" through (0, 3.81, -22.5806) normal (0, 1, 0) x (0, 0, 1)
extrude "擠出2" add sketch "草圖2" along normal up to surface (3.81 mm away) contours L3 L2 L1 L0
sketch "草圖3" plane through (-7.904, 3.81, -41.4846) normal (0, 1, 0) x (1, 0, 0)
  circle A0 centre (14, -43.7706) radius 1.6 projected
  circle A1 centre (14, -16.618) radius 1.6 projected
  circle A2 centre (14, -43.7706) radius 2.75
  circle A3 centre (14, -16.618) radius 2.75
  point P0 (7.904, -41.4846)
  dimension "d10" = 5.5
  dimension "d11" = 5.5
extrude "擠出3" cut sketch "草圖3" against normal blind 2.5 contours A0 | A1 | A2 | A3
sketch "草圖4" plane through (-7.904, -4.2926, 8.5154) normal (0, 0, 1) x (1, 0, 0)
  line L0 (28, 8.1026) -> (0, 8.1026) projected
  line L1 (0, 8.1026) -> (0, 11.2055)
  line L2 (0, 11.2055) -> (-1.5, 11.2055)
  line L3 (-1.5, 11.2055) -> (-1.5, 12.7055)
  line L4 (-1.5, 12.7055) -> (3.5, 12.7055)
  line L5 (3.5, 12.7055) -> (3.5, 11.2055)
  line L6 (3.5, 11.2055) -> (2, 11.2055)
  line L7 (2, 11.2055) -> (2, 8.1026)
  line L8 (0, 0) -> (0, 8.1026) projected
  line L9 (14, 8.1026) -> (14, 0)
  line L10 (0, 0) -> (28, 0) projected
  line L11 (28, 8.1026) -> (28, 11.2055)
  line L12 (28, 11.2055) -> (29.5, 11.2055)
  line L13 (29.5, 11.2055) -> (29.5, 12.7055)
  line L14 (29.5, 12.7055) -> (24.5, 12.7055)
  line L15 (24.5, 12.7055) -> (24.5, 11.2055)
  line L16 (24.5, 11.2055) -> (26, 11.2055)
  line L17 (26, 11.2055) -> (26, 8.1026)
  point P0 (7.904, 4.2926)
  point P1 (-0.75, 11.2055)
  point P2 (2.75, 11.2055)
  point P3 (28.75, 11.2055)
  point P4 (25.25, 11.2055)
  point P5 (26, 8.1026)
  point P6 (1, 12.7055)
  dimension "d18" = 2
  dimension "d19" = 1.5
  dimension "d20" = 1.5
  dimension "d21" = 1.5
  dimension "d22" = 1.5
extrude "擠出4" add sketch "草圖4" against normal up to surface (50 mm away) contours L0 L17 L16 L15 L14 L13 L12 L11 | L0 L1 L2 L3 L4 L5 L6 L7
properties part number "sg90 claw v2_3D 列印"
